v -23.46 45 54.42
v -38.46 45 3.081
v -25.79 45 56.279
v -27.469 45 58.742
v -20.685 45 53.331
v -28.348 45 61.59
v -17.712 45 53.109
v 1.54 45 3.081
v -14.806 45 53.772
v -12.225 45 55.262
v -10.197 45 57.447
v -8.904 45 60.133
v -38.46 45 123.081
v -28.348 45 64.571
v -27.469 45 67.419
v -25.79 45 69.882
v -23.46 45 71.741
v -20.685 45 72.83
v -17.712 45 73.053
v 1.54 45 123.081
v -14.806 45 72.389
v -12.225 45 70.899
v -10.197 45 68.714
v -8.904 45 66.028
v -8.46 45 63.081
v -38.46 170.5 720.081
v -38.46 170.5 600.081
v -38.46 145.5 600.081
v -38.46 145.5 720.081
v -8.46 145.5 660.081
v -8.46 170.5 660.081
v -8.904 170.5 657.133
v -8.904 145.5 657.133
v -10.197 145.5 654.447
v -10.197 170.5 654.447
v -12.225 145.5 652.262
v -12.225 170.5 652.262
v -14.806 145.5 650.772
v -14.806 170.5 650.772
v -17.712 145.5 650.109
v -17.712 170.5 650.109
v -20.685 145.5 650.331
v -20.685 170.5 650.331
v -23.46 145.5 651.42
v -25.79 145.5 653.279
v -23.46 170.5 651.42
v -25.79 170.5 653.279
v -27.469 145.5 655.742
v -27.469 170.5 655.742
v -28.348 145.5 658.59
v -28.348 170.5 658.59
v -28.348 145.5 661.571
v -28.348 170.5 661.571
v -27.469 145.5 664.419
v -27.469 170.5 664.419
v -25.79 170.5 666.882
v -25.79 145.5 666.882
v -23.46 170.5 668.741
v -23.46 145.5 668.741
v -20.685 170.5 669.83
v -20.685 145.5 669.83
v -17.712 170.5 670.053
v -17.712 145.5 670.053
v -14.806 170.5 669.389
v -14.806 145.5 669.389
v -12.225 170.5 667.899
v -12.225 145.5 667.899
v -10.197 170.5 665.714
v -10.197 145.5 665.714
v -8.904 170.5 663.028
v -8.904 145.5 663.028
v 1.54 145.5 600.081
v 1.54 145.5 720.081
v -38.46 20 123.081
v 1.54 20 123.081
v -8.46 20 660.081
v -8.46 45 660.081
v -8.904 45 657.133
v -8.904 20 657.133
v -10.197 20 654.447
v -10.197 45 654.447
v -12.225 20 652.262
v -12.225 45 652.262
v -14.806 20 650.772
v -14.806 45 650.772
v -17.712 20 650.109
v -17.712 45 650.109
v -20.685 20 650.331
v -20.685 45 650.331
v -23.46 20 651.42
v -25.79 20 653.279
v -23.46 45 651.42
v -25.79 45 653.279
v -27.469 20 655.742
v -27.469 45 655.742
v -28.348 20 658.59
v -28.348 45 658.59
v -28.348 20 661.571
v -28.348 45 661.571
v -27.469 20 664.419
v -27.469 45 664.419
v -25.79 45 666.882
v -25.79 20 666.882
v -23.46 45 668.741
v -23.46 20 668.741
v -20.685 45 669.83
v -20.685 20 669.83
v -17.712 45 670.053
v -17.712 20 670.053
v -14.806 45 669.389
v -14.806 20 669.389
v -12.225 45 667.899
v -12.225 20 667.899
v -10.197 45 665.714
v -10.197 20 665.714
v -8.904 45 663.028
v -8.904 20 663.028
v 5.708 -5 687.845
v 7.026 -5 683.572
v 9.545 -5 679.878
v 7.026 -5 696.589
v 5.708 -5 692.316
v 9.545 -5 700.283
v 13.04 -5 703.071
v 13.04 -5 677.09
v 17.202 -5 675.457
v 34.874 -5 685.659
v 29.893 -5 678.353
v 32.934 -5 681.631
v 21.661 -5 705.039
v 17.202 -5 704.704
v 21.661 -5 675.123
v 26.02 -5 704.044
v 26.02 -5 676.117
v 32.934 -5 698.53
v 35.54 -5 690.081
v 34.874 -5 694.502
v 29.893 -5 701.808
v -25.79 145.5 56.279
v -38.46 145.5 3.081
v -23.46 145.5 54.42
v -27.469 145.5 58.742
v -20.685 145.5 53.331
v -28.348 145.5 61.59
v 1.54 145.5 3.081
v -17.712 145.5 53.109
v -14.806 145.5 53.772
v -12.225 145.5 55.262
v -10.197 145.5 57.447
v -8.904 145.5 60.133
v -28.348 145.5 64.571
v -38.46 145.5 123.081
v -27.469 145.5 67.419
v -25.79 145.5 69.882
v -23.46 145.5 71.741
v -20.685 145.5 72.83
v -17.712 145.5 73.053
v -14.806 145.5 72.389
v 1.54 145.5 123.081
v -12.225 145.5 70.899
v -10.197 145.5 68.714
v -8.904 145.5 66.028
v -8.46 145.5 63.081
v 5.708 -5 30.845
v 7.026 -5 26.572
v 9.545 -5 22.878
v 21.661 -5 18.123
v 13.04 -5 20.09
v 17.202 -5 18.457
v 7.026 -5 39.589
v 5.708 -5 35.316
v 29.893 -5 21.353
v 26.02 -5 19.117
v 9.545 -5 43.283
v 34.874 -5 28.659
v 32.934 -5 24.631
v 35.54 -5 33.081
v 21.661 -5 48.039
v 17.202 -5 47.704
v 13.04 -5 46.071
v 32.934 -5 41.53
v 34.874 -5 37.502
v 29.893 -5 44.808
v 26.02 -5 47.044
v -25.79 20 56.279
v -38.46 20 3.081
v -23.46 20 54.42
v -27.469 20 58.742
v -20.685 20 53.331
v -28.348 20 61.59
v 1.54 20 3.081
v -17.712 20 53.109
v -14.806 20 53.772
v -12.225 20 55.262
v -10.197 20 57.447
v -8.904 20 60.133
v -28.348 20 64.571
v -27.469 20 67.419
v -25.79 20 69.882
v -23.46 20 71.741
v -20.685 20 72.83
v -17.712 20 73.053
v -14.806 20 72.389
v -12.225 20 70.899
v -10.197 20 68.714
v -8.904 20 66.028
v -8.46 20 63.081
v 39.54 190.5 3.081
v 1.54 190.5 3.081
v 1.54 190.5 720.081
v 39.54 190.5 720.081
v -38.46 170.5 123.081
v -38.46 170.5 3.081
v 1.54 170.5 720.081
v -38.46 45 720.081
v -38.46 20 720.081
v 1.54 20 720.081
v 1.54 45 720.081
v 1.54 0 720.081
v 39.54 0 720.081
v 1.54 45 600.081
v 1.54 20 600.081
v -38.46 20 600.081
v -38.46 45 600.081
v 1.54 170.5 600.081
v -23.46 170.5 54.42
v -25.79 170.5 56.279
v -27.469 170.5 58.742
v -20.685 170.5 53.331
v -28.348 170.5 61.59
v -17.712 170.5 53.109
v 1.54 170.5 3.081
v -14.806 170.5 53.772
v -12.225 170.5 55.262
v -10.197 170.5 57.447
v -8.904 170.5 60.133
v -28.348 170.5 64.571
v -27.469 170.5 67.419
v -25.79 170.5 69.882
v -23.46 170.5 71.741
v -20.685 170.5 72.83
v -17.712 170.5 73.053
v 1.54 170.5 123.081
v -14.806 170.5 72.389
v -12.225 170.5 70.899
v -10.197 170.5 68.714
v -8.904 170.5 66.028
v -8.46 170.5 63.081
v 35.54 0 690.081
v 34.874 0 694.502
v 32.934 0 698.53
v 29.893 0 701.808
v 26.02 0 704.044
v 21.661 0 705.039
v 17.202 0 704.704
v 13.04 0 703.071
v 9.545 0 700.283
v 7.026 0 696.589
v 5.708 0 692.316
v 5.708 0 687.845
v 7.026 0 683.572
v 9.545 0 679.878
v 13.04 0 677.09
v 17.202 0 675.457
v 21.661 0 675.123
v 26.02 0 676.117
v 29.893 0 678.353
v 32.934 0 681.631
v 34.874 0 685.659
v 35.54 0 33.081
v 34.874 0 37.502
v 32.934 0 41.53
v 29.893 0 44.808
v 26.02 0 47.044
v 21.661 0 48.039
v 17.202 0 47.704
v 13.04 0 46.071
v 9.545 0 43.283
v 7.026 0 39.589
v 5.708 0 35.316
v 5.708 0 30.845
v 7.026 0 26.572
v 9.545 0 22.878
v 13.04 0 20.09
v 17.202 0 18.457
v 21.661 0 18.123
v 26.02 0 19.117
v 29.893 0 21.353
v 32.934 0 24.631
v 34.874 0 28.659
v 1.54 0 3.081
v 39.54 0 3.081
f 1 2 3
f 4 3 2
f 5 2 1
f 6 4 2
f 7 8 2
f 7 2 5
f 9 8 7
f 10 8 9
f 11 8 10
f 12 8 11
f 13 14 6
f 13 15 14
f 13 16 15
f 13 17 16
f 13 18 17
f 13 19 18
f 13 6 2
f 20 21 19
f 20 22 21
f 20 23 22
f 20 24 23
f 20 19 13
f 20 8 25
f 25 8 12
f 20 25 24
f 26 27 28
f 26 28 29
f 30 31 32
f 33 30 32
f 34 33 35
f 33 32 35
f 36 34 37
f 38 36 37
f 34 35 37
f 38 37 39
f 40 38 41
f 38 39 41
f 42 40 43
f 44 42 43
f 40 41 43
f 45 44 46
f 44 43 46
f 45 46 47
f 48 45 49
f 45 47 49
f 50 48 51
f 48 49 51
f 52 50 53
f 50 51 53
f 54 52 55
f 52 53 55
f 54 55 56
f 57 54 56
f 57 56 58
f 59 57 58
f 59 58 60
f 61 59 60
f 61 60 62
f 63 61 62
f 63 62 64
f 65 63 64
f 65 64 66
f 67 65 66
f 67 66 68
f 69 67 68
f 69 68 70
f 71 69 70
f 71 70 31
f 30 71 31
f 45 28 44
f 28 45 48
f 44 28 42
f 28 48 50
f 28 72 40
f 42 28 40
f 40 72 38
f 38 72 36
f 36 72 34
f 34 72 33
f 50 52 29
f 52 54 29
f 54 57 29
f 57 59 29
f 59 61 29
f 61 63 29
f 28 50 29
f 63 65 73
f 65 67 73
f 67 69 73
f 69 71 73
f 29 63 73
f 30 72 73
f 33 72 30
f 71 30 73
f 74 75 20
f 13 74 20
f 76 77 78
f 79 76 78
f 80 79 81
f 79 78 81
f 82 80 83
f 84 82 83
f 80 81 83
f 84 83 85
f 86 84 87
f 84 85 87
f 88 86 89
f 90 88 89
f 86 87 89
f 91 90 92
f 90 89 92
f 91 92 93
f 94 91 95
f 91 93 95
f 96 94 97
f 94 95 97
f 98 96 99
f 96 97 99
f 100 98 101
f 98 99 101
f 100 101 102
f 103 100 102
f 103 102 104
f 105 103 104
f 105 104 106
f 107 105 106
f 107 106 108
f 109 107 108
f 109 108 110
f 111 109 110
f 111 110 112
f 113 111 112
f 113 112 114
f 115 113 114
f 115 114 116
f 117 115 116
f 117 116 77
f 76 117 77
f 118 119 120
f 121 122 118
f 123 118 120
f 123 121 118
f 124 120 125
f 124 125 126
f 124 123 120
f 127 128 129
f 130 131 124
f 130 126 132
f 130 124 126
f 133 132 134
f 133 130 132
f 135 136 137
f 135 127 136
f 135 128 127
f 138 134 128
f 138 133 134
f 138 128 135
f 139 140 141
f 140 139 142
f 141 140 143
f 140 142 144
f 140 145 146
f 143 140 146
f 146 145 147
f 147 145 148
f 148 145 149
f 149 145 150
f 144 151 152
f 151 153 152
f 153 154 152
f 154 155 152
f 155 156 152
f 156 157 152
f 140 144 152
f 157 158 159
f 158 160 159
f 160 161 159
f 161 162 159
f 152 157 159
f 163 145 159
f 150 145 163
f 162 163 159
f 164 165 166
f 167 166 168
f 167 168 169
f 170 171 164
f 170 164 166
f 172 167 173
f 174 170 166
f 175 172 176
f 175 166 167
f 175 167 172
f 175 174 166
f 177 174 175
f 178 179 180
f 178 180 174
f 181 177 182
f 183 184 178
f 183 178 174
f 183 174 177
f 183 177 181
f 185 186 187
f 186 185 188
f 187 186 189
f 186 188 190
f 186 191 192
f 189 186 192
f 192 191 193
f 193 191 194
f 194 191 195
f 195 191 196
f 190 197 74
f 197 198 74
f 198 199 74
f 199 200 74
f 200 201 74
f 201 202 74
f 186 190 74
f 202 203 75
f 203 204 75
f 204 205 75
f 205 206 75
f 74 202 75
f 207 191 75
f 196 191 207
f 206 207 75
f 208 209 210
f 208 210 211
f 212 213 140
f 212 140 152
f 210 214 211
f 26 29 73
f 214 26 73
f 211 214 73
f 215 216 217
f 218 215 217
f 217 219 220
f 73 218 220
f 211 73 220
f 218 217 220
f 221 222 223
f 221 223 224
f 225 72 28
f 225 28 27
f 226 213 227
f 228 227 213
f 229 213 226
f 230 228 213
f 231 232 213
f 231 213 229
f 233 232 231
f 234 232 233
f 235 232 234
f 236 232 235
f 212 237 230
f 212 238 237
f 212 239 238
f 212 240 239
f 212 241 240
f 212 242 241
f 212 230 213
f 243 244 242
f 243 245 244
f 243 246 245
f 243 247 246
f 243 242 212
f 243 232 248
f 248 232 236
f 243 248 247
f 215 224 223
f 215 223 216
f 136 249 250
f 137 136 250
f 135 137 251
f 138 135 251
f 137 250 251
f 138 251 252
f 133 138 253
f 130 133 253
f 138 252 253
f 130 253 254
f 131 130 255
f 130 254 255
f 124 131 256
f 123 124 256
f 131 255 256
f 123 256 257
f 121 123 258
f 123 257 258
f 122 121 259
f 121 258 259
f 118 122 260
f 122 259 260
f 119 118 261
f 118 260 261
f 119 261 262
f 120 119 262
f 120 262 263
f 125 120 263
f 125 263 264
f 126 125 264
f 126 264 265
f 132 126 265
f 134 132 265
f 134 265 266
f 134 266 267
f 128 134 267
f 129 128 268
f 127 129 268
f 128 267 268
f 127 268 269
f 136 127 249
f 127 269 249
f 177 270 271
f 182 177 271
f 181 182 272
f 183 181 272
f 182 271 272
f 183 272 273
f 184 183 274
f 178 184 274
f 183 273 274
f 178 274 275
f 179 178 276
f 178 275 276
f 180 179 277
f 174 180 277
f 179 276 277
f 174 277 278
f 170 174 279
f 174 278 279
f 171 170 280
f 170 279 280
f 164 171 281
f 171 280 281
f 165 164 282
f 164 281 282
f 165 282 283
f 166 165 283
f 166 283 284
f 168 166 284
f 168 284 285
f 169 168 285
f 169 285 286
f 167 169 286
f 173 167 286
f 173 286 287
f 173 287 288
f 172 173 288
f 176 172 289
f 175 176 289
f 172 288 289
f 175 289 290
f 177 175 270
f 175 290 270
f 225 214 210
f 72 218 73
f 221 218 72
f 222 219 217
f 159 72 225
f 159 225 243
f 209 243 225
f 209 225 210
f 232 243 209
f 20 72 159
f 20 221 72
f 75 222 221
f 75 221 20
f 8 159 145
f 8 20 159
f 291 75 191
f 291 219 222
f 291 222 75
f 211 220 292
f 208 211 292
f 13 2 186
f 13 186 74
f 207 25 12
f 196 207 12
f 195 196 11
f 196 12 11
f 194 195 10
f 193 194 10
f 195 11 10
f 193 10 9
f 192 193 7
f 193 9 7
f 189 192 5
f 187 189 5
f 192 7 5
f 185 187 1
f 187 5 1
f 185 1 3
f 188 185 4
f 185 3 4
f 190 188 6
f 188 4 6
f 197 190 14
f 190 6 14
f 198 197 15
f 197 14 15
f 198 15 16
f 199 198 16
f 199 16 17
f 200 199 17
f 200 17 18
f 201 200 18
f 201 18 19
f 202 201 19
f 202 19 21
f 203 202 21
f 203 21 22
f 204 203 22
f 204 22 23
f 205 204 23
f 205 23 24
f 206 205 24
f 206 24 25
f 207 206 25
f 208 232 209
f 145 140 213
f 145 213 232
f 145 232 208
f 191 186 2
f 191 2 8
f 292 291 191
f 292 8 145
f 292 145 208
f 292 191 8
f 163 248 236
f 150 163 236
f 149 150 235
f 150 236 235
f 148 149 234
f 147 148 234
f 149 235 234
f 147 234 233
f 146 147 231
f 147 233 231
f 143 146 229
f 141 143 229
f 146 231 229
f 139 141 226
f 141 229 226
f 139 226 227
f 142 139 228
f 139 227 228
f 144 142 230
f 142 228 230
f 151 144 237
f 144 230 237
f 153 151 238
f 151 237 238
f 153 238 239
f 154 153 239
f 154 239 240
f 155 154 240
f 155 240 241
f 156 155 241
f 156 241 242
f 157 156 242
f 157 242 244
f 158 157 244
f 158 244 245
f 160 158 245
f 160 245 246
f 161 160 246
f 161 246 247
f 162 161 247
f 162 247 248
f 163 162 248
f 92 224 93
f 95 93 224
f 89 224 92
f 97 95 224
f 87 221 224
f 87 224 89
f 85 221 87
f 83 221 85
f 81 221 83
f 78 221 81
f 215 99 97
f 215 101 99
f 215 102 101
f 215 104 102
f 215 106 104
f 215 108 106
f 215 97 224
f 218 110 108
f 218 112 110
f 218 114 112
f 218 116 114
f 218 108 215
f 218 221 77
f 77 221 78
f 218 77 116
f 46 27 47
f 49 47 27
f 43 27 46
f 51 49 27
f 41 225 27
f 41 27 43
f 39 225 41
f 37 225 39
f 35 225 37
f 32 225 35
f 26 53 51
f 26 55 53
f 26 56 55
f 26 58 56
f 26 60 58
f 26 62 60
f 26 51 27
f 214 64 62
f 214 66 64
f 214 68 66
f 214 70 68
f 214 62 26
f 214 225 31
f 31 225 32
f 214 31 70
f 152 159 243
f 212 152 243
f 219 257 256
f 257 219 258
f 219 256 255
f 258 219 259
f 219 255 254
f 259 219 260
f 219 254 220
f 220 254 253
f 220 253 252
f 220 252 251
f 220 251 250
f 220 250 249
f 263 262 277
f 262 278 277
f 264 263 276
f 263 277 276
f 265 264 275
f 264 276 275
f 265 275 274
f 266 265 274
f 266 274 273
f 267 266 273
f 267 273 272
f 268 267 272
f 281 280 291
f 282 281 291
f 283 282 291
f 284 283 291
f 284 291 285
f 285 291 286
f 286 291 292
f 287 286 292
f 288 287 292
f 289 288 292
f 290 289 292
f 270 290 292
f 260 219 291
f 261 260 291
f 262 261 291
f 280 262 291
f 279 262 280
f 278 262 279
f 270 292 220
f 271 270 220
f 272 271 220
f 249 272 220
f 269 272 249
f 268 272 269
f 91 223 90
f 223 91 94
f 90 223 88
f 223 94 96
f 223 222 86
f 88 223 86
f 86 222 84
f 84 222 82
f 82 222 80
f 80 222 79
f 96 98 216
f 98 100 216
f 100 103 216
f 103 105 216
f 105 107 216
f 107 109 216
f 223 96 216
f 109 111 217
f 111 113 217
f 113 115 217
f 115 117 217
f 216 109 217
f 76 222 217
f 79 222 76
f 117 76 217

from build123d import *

# Parameters (mm, degrees)
SKETCH1_W           = 38
SKETCH1_H           = 717
BOSS_EXTRUDE1_DEPTH = 190.5
SKETCH3_W           = 120
SKETCH3_H           = 25
BOSS_EXTRUDE2_DEPTH = 40
SKETCH4_R           = 10
CUT_EXTRUDE1_DEPTH  = 506
SKETCH5_R           = 15
BOSS_EXTRUDE3_DEPTH = 5


with BuildPart() as part:
    # Sketch1 → Boss-Extrude1 (new body)
    with BuildSketch(Plane(origin=(0, 0, 0), x_dir=(1, 0, 0), z_dir=(0, 1, 0))):
        with Locations((20.54028436, -361.58056872)):
            Rectangle(SKETCH1_W, SKETCH1_H)
    extrude(amount=BOSS_EXTRUDE1_DEPTH)

    # Sketch3 → Boss-Extrude2 (add)
    with BuildSketch(Plane.ZY.offset(-1.54028436)):
        with Locations((63.08056872, 158)):
            Rectangle(SKETCH3_W, SKETCH3_H)
        with Locations((63.08056872, 32.5)):
            Rectangle(SKETCH3_W, SKETCH3_H)
        with Locations((660.08056872, 32.5)):
            Rectangle(SKETCH3_W, SKETCH3_H)
        with Locations((660.08056872, 158)):
            Rectangle(SKETCH3_W, SKETCH3_H)
    extrude(amount=BOSS_EXTRUDE2_DEPTH)

    # Sketch4 → Cut-Extrude1 (cut)
    with BuildSketch(Plane(origin=(0, 170.5, 0), x_dir=(1, 0, 0), z_dir=(0, 1, 0))):
        with Locations((-18.45971564, -63.08056872)):
            Circle(SKETCH4_R)
        with Locations((-18.45971564, -660.08056872)):
            Circle(SKETCH4_R)
    extrude(amount=-CUT_EXTRUDE1_DEPTH, mode=Mode.SUBTRACT)

    # Sketch5 → Boss-Extrude3 (add)
    with BuildSketch(Plane.XZ):
        with Locations((20.54028436, 690.08056872)):
            Circle(SKETCH5_R)
        with Locations((20.54028436, 33.08056872)):
            Circle(SKETCH5_R)
    extrude(amount=BOSS_EXTRUDE3_DEPTH)


solid = part.part
